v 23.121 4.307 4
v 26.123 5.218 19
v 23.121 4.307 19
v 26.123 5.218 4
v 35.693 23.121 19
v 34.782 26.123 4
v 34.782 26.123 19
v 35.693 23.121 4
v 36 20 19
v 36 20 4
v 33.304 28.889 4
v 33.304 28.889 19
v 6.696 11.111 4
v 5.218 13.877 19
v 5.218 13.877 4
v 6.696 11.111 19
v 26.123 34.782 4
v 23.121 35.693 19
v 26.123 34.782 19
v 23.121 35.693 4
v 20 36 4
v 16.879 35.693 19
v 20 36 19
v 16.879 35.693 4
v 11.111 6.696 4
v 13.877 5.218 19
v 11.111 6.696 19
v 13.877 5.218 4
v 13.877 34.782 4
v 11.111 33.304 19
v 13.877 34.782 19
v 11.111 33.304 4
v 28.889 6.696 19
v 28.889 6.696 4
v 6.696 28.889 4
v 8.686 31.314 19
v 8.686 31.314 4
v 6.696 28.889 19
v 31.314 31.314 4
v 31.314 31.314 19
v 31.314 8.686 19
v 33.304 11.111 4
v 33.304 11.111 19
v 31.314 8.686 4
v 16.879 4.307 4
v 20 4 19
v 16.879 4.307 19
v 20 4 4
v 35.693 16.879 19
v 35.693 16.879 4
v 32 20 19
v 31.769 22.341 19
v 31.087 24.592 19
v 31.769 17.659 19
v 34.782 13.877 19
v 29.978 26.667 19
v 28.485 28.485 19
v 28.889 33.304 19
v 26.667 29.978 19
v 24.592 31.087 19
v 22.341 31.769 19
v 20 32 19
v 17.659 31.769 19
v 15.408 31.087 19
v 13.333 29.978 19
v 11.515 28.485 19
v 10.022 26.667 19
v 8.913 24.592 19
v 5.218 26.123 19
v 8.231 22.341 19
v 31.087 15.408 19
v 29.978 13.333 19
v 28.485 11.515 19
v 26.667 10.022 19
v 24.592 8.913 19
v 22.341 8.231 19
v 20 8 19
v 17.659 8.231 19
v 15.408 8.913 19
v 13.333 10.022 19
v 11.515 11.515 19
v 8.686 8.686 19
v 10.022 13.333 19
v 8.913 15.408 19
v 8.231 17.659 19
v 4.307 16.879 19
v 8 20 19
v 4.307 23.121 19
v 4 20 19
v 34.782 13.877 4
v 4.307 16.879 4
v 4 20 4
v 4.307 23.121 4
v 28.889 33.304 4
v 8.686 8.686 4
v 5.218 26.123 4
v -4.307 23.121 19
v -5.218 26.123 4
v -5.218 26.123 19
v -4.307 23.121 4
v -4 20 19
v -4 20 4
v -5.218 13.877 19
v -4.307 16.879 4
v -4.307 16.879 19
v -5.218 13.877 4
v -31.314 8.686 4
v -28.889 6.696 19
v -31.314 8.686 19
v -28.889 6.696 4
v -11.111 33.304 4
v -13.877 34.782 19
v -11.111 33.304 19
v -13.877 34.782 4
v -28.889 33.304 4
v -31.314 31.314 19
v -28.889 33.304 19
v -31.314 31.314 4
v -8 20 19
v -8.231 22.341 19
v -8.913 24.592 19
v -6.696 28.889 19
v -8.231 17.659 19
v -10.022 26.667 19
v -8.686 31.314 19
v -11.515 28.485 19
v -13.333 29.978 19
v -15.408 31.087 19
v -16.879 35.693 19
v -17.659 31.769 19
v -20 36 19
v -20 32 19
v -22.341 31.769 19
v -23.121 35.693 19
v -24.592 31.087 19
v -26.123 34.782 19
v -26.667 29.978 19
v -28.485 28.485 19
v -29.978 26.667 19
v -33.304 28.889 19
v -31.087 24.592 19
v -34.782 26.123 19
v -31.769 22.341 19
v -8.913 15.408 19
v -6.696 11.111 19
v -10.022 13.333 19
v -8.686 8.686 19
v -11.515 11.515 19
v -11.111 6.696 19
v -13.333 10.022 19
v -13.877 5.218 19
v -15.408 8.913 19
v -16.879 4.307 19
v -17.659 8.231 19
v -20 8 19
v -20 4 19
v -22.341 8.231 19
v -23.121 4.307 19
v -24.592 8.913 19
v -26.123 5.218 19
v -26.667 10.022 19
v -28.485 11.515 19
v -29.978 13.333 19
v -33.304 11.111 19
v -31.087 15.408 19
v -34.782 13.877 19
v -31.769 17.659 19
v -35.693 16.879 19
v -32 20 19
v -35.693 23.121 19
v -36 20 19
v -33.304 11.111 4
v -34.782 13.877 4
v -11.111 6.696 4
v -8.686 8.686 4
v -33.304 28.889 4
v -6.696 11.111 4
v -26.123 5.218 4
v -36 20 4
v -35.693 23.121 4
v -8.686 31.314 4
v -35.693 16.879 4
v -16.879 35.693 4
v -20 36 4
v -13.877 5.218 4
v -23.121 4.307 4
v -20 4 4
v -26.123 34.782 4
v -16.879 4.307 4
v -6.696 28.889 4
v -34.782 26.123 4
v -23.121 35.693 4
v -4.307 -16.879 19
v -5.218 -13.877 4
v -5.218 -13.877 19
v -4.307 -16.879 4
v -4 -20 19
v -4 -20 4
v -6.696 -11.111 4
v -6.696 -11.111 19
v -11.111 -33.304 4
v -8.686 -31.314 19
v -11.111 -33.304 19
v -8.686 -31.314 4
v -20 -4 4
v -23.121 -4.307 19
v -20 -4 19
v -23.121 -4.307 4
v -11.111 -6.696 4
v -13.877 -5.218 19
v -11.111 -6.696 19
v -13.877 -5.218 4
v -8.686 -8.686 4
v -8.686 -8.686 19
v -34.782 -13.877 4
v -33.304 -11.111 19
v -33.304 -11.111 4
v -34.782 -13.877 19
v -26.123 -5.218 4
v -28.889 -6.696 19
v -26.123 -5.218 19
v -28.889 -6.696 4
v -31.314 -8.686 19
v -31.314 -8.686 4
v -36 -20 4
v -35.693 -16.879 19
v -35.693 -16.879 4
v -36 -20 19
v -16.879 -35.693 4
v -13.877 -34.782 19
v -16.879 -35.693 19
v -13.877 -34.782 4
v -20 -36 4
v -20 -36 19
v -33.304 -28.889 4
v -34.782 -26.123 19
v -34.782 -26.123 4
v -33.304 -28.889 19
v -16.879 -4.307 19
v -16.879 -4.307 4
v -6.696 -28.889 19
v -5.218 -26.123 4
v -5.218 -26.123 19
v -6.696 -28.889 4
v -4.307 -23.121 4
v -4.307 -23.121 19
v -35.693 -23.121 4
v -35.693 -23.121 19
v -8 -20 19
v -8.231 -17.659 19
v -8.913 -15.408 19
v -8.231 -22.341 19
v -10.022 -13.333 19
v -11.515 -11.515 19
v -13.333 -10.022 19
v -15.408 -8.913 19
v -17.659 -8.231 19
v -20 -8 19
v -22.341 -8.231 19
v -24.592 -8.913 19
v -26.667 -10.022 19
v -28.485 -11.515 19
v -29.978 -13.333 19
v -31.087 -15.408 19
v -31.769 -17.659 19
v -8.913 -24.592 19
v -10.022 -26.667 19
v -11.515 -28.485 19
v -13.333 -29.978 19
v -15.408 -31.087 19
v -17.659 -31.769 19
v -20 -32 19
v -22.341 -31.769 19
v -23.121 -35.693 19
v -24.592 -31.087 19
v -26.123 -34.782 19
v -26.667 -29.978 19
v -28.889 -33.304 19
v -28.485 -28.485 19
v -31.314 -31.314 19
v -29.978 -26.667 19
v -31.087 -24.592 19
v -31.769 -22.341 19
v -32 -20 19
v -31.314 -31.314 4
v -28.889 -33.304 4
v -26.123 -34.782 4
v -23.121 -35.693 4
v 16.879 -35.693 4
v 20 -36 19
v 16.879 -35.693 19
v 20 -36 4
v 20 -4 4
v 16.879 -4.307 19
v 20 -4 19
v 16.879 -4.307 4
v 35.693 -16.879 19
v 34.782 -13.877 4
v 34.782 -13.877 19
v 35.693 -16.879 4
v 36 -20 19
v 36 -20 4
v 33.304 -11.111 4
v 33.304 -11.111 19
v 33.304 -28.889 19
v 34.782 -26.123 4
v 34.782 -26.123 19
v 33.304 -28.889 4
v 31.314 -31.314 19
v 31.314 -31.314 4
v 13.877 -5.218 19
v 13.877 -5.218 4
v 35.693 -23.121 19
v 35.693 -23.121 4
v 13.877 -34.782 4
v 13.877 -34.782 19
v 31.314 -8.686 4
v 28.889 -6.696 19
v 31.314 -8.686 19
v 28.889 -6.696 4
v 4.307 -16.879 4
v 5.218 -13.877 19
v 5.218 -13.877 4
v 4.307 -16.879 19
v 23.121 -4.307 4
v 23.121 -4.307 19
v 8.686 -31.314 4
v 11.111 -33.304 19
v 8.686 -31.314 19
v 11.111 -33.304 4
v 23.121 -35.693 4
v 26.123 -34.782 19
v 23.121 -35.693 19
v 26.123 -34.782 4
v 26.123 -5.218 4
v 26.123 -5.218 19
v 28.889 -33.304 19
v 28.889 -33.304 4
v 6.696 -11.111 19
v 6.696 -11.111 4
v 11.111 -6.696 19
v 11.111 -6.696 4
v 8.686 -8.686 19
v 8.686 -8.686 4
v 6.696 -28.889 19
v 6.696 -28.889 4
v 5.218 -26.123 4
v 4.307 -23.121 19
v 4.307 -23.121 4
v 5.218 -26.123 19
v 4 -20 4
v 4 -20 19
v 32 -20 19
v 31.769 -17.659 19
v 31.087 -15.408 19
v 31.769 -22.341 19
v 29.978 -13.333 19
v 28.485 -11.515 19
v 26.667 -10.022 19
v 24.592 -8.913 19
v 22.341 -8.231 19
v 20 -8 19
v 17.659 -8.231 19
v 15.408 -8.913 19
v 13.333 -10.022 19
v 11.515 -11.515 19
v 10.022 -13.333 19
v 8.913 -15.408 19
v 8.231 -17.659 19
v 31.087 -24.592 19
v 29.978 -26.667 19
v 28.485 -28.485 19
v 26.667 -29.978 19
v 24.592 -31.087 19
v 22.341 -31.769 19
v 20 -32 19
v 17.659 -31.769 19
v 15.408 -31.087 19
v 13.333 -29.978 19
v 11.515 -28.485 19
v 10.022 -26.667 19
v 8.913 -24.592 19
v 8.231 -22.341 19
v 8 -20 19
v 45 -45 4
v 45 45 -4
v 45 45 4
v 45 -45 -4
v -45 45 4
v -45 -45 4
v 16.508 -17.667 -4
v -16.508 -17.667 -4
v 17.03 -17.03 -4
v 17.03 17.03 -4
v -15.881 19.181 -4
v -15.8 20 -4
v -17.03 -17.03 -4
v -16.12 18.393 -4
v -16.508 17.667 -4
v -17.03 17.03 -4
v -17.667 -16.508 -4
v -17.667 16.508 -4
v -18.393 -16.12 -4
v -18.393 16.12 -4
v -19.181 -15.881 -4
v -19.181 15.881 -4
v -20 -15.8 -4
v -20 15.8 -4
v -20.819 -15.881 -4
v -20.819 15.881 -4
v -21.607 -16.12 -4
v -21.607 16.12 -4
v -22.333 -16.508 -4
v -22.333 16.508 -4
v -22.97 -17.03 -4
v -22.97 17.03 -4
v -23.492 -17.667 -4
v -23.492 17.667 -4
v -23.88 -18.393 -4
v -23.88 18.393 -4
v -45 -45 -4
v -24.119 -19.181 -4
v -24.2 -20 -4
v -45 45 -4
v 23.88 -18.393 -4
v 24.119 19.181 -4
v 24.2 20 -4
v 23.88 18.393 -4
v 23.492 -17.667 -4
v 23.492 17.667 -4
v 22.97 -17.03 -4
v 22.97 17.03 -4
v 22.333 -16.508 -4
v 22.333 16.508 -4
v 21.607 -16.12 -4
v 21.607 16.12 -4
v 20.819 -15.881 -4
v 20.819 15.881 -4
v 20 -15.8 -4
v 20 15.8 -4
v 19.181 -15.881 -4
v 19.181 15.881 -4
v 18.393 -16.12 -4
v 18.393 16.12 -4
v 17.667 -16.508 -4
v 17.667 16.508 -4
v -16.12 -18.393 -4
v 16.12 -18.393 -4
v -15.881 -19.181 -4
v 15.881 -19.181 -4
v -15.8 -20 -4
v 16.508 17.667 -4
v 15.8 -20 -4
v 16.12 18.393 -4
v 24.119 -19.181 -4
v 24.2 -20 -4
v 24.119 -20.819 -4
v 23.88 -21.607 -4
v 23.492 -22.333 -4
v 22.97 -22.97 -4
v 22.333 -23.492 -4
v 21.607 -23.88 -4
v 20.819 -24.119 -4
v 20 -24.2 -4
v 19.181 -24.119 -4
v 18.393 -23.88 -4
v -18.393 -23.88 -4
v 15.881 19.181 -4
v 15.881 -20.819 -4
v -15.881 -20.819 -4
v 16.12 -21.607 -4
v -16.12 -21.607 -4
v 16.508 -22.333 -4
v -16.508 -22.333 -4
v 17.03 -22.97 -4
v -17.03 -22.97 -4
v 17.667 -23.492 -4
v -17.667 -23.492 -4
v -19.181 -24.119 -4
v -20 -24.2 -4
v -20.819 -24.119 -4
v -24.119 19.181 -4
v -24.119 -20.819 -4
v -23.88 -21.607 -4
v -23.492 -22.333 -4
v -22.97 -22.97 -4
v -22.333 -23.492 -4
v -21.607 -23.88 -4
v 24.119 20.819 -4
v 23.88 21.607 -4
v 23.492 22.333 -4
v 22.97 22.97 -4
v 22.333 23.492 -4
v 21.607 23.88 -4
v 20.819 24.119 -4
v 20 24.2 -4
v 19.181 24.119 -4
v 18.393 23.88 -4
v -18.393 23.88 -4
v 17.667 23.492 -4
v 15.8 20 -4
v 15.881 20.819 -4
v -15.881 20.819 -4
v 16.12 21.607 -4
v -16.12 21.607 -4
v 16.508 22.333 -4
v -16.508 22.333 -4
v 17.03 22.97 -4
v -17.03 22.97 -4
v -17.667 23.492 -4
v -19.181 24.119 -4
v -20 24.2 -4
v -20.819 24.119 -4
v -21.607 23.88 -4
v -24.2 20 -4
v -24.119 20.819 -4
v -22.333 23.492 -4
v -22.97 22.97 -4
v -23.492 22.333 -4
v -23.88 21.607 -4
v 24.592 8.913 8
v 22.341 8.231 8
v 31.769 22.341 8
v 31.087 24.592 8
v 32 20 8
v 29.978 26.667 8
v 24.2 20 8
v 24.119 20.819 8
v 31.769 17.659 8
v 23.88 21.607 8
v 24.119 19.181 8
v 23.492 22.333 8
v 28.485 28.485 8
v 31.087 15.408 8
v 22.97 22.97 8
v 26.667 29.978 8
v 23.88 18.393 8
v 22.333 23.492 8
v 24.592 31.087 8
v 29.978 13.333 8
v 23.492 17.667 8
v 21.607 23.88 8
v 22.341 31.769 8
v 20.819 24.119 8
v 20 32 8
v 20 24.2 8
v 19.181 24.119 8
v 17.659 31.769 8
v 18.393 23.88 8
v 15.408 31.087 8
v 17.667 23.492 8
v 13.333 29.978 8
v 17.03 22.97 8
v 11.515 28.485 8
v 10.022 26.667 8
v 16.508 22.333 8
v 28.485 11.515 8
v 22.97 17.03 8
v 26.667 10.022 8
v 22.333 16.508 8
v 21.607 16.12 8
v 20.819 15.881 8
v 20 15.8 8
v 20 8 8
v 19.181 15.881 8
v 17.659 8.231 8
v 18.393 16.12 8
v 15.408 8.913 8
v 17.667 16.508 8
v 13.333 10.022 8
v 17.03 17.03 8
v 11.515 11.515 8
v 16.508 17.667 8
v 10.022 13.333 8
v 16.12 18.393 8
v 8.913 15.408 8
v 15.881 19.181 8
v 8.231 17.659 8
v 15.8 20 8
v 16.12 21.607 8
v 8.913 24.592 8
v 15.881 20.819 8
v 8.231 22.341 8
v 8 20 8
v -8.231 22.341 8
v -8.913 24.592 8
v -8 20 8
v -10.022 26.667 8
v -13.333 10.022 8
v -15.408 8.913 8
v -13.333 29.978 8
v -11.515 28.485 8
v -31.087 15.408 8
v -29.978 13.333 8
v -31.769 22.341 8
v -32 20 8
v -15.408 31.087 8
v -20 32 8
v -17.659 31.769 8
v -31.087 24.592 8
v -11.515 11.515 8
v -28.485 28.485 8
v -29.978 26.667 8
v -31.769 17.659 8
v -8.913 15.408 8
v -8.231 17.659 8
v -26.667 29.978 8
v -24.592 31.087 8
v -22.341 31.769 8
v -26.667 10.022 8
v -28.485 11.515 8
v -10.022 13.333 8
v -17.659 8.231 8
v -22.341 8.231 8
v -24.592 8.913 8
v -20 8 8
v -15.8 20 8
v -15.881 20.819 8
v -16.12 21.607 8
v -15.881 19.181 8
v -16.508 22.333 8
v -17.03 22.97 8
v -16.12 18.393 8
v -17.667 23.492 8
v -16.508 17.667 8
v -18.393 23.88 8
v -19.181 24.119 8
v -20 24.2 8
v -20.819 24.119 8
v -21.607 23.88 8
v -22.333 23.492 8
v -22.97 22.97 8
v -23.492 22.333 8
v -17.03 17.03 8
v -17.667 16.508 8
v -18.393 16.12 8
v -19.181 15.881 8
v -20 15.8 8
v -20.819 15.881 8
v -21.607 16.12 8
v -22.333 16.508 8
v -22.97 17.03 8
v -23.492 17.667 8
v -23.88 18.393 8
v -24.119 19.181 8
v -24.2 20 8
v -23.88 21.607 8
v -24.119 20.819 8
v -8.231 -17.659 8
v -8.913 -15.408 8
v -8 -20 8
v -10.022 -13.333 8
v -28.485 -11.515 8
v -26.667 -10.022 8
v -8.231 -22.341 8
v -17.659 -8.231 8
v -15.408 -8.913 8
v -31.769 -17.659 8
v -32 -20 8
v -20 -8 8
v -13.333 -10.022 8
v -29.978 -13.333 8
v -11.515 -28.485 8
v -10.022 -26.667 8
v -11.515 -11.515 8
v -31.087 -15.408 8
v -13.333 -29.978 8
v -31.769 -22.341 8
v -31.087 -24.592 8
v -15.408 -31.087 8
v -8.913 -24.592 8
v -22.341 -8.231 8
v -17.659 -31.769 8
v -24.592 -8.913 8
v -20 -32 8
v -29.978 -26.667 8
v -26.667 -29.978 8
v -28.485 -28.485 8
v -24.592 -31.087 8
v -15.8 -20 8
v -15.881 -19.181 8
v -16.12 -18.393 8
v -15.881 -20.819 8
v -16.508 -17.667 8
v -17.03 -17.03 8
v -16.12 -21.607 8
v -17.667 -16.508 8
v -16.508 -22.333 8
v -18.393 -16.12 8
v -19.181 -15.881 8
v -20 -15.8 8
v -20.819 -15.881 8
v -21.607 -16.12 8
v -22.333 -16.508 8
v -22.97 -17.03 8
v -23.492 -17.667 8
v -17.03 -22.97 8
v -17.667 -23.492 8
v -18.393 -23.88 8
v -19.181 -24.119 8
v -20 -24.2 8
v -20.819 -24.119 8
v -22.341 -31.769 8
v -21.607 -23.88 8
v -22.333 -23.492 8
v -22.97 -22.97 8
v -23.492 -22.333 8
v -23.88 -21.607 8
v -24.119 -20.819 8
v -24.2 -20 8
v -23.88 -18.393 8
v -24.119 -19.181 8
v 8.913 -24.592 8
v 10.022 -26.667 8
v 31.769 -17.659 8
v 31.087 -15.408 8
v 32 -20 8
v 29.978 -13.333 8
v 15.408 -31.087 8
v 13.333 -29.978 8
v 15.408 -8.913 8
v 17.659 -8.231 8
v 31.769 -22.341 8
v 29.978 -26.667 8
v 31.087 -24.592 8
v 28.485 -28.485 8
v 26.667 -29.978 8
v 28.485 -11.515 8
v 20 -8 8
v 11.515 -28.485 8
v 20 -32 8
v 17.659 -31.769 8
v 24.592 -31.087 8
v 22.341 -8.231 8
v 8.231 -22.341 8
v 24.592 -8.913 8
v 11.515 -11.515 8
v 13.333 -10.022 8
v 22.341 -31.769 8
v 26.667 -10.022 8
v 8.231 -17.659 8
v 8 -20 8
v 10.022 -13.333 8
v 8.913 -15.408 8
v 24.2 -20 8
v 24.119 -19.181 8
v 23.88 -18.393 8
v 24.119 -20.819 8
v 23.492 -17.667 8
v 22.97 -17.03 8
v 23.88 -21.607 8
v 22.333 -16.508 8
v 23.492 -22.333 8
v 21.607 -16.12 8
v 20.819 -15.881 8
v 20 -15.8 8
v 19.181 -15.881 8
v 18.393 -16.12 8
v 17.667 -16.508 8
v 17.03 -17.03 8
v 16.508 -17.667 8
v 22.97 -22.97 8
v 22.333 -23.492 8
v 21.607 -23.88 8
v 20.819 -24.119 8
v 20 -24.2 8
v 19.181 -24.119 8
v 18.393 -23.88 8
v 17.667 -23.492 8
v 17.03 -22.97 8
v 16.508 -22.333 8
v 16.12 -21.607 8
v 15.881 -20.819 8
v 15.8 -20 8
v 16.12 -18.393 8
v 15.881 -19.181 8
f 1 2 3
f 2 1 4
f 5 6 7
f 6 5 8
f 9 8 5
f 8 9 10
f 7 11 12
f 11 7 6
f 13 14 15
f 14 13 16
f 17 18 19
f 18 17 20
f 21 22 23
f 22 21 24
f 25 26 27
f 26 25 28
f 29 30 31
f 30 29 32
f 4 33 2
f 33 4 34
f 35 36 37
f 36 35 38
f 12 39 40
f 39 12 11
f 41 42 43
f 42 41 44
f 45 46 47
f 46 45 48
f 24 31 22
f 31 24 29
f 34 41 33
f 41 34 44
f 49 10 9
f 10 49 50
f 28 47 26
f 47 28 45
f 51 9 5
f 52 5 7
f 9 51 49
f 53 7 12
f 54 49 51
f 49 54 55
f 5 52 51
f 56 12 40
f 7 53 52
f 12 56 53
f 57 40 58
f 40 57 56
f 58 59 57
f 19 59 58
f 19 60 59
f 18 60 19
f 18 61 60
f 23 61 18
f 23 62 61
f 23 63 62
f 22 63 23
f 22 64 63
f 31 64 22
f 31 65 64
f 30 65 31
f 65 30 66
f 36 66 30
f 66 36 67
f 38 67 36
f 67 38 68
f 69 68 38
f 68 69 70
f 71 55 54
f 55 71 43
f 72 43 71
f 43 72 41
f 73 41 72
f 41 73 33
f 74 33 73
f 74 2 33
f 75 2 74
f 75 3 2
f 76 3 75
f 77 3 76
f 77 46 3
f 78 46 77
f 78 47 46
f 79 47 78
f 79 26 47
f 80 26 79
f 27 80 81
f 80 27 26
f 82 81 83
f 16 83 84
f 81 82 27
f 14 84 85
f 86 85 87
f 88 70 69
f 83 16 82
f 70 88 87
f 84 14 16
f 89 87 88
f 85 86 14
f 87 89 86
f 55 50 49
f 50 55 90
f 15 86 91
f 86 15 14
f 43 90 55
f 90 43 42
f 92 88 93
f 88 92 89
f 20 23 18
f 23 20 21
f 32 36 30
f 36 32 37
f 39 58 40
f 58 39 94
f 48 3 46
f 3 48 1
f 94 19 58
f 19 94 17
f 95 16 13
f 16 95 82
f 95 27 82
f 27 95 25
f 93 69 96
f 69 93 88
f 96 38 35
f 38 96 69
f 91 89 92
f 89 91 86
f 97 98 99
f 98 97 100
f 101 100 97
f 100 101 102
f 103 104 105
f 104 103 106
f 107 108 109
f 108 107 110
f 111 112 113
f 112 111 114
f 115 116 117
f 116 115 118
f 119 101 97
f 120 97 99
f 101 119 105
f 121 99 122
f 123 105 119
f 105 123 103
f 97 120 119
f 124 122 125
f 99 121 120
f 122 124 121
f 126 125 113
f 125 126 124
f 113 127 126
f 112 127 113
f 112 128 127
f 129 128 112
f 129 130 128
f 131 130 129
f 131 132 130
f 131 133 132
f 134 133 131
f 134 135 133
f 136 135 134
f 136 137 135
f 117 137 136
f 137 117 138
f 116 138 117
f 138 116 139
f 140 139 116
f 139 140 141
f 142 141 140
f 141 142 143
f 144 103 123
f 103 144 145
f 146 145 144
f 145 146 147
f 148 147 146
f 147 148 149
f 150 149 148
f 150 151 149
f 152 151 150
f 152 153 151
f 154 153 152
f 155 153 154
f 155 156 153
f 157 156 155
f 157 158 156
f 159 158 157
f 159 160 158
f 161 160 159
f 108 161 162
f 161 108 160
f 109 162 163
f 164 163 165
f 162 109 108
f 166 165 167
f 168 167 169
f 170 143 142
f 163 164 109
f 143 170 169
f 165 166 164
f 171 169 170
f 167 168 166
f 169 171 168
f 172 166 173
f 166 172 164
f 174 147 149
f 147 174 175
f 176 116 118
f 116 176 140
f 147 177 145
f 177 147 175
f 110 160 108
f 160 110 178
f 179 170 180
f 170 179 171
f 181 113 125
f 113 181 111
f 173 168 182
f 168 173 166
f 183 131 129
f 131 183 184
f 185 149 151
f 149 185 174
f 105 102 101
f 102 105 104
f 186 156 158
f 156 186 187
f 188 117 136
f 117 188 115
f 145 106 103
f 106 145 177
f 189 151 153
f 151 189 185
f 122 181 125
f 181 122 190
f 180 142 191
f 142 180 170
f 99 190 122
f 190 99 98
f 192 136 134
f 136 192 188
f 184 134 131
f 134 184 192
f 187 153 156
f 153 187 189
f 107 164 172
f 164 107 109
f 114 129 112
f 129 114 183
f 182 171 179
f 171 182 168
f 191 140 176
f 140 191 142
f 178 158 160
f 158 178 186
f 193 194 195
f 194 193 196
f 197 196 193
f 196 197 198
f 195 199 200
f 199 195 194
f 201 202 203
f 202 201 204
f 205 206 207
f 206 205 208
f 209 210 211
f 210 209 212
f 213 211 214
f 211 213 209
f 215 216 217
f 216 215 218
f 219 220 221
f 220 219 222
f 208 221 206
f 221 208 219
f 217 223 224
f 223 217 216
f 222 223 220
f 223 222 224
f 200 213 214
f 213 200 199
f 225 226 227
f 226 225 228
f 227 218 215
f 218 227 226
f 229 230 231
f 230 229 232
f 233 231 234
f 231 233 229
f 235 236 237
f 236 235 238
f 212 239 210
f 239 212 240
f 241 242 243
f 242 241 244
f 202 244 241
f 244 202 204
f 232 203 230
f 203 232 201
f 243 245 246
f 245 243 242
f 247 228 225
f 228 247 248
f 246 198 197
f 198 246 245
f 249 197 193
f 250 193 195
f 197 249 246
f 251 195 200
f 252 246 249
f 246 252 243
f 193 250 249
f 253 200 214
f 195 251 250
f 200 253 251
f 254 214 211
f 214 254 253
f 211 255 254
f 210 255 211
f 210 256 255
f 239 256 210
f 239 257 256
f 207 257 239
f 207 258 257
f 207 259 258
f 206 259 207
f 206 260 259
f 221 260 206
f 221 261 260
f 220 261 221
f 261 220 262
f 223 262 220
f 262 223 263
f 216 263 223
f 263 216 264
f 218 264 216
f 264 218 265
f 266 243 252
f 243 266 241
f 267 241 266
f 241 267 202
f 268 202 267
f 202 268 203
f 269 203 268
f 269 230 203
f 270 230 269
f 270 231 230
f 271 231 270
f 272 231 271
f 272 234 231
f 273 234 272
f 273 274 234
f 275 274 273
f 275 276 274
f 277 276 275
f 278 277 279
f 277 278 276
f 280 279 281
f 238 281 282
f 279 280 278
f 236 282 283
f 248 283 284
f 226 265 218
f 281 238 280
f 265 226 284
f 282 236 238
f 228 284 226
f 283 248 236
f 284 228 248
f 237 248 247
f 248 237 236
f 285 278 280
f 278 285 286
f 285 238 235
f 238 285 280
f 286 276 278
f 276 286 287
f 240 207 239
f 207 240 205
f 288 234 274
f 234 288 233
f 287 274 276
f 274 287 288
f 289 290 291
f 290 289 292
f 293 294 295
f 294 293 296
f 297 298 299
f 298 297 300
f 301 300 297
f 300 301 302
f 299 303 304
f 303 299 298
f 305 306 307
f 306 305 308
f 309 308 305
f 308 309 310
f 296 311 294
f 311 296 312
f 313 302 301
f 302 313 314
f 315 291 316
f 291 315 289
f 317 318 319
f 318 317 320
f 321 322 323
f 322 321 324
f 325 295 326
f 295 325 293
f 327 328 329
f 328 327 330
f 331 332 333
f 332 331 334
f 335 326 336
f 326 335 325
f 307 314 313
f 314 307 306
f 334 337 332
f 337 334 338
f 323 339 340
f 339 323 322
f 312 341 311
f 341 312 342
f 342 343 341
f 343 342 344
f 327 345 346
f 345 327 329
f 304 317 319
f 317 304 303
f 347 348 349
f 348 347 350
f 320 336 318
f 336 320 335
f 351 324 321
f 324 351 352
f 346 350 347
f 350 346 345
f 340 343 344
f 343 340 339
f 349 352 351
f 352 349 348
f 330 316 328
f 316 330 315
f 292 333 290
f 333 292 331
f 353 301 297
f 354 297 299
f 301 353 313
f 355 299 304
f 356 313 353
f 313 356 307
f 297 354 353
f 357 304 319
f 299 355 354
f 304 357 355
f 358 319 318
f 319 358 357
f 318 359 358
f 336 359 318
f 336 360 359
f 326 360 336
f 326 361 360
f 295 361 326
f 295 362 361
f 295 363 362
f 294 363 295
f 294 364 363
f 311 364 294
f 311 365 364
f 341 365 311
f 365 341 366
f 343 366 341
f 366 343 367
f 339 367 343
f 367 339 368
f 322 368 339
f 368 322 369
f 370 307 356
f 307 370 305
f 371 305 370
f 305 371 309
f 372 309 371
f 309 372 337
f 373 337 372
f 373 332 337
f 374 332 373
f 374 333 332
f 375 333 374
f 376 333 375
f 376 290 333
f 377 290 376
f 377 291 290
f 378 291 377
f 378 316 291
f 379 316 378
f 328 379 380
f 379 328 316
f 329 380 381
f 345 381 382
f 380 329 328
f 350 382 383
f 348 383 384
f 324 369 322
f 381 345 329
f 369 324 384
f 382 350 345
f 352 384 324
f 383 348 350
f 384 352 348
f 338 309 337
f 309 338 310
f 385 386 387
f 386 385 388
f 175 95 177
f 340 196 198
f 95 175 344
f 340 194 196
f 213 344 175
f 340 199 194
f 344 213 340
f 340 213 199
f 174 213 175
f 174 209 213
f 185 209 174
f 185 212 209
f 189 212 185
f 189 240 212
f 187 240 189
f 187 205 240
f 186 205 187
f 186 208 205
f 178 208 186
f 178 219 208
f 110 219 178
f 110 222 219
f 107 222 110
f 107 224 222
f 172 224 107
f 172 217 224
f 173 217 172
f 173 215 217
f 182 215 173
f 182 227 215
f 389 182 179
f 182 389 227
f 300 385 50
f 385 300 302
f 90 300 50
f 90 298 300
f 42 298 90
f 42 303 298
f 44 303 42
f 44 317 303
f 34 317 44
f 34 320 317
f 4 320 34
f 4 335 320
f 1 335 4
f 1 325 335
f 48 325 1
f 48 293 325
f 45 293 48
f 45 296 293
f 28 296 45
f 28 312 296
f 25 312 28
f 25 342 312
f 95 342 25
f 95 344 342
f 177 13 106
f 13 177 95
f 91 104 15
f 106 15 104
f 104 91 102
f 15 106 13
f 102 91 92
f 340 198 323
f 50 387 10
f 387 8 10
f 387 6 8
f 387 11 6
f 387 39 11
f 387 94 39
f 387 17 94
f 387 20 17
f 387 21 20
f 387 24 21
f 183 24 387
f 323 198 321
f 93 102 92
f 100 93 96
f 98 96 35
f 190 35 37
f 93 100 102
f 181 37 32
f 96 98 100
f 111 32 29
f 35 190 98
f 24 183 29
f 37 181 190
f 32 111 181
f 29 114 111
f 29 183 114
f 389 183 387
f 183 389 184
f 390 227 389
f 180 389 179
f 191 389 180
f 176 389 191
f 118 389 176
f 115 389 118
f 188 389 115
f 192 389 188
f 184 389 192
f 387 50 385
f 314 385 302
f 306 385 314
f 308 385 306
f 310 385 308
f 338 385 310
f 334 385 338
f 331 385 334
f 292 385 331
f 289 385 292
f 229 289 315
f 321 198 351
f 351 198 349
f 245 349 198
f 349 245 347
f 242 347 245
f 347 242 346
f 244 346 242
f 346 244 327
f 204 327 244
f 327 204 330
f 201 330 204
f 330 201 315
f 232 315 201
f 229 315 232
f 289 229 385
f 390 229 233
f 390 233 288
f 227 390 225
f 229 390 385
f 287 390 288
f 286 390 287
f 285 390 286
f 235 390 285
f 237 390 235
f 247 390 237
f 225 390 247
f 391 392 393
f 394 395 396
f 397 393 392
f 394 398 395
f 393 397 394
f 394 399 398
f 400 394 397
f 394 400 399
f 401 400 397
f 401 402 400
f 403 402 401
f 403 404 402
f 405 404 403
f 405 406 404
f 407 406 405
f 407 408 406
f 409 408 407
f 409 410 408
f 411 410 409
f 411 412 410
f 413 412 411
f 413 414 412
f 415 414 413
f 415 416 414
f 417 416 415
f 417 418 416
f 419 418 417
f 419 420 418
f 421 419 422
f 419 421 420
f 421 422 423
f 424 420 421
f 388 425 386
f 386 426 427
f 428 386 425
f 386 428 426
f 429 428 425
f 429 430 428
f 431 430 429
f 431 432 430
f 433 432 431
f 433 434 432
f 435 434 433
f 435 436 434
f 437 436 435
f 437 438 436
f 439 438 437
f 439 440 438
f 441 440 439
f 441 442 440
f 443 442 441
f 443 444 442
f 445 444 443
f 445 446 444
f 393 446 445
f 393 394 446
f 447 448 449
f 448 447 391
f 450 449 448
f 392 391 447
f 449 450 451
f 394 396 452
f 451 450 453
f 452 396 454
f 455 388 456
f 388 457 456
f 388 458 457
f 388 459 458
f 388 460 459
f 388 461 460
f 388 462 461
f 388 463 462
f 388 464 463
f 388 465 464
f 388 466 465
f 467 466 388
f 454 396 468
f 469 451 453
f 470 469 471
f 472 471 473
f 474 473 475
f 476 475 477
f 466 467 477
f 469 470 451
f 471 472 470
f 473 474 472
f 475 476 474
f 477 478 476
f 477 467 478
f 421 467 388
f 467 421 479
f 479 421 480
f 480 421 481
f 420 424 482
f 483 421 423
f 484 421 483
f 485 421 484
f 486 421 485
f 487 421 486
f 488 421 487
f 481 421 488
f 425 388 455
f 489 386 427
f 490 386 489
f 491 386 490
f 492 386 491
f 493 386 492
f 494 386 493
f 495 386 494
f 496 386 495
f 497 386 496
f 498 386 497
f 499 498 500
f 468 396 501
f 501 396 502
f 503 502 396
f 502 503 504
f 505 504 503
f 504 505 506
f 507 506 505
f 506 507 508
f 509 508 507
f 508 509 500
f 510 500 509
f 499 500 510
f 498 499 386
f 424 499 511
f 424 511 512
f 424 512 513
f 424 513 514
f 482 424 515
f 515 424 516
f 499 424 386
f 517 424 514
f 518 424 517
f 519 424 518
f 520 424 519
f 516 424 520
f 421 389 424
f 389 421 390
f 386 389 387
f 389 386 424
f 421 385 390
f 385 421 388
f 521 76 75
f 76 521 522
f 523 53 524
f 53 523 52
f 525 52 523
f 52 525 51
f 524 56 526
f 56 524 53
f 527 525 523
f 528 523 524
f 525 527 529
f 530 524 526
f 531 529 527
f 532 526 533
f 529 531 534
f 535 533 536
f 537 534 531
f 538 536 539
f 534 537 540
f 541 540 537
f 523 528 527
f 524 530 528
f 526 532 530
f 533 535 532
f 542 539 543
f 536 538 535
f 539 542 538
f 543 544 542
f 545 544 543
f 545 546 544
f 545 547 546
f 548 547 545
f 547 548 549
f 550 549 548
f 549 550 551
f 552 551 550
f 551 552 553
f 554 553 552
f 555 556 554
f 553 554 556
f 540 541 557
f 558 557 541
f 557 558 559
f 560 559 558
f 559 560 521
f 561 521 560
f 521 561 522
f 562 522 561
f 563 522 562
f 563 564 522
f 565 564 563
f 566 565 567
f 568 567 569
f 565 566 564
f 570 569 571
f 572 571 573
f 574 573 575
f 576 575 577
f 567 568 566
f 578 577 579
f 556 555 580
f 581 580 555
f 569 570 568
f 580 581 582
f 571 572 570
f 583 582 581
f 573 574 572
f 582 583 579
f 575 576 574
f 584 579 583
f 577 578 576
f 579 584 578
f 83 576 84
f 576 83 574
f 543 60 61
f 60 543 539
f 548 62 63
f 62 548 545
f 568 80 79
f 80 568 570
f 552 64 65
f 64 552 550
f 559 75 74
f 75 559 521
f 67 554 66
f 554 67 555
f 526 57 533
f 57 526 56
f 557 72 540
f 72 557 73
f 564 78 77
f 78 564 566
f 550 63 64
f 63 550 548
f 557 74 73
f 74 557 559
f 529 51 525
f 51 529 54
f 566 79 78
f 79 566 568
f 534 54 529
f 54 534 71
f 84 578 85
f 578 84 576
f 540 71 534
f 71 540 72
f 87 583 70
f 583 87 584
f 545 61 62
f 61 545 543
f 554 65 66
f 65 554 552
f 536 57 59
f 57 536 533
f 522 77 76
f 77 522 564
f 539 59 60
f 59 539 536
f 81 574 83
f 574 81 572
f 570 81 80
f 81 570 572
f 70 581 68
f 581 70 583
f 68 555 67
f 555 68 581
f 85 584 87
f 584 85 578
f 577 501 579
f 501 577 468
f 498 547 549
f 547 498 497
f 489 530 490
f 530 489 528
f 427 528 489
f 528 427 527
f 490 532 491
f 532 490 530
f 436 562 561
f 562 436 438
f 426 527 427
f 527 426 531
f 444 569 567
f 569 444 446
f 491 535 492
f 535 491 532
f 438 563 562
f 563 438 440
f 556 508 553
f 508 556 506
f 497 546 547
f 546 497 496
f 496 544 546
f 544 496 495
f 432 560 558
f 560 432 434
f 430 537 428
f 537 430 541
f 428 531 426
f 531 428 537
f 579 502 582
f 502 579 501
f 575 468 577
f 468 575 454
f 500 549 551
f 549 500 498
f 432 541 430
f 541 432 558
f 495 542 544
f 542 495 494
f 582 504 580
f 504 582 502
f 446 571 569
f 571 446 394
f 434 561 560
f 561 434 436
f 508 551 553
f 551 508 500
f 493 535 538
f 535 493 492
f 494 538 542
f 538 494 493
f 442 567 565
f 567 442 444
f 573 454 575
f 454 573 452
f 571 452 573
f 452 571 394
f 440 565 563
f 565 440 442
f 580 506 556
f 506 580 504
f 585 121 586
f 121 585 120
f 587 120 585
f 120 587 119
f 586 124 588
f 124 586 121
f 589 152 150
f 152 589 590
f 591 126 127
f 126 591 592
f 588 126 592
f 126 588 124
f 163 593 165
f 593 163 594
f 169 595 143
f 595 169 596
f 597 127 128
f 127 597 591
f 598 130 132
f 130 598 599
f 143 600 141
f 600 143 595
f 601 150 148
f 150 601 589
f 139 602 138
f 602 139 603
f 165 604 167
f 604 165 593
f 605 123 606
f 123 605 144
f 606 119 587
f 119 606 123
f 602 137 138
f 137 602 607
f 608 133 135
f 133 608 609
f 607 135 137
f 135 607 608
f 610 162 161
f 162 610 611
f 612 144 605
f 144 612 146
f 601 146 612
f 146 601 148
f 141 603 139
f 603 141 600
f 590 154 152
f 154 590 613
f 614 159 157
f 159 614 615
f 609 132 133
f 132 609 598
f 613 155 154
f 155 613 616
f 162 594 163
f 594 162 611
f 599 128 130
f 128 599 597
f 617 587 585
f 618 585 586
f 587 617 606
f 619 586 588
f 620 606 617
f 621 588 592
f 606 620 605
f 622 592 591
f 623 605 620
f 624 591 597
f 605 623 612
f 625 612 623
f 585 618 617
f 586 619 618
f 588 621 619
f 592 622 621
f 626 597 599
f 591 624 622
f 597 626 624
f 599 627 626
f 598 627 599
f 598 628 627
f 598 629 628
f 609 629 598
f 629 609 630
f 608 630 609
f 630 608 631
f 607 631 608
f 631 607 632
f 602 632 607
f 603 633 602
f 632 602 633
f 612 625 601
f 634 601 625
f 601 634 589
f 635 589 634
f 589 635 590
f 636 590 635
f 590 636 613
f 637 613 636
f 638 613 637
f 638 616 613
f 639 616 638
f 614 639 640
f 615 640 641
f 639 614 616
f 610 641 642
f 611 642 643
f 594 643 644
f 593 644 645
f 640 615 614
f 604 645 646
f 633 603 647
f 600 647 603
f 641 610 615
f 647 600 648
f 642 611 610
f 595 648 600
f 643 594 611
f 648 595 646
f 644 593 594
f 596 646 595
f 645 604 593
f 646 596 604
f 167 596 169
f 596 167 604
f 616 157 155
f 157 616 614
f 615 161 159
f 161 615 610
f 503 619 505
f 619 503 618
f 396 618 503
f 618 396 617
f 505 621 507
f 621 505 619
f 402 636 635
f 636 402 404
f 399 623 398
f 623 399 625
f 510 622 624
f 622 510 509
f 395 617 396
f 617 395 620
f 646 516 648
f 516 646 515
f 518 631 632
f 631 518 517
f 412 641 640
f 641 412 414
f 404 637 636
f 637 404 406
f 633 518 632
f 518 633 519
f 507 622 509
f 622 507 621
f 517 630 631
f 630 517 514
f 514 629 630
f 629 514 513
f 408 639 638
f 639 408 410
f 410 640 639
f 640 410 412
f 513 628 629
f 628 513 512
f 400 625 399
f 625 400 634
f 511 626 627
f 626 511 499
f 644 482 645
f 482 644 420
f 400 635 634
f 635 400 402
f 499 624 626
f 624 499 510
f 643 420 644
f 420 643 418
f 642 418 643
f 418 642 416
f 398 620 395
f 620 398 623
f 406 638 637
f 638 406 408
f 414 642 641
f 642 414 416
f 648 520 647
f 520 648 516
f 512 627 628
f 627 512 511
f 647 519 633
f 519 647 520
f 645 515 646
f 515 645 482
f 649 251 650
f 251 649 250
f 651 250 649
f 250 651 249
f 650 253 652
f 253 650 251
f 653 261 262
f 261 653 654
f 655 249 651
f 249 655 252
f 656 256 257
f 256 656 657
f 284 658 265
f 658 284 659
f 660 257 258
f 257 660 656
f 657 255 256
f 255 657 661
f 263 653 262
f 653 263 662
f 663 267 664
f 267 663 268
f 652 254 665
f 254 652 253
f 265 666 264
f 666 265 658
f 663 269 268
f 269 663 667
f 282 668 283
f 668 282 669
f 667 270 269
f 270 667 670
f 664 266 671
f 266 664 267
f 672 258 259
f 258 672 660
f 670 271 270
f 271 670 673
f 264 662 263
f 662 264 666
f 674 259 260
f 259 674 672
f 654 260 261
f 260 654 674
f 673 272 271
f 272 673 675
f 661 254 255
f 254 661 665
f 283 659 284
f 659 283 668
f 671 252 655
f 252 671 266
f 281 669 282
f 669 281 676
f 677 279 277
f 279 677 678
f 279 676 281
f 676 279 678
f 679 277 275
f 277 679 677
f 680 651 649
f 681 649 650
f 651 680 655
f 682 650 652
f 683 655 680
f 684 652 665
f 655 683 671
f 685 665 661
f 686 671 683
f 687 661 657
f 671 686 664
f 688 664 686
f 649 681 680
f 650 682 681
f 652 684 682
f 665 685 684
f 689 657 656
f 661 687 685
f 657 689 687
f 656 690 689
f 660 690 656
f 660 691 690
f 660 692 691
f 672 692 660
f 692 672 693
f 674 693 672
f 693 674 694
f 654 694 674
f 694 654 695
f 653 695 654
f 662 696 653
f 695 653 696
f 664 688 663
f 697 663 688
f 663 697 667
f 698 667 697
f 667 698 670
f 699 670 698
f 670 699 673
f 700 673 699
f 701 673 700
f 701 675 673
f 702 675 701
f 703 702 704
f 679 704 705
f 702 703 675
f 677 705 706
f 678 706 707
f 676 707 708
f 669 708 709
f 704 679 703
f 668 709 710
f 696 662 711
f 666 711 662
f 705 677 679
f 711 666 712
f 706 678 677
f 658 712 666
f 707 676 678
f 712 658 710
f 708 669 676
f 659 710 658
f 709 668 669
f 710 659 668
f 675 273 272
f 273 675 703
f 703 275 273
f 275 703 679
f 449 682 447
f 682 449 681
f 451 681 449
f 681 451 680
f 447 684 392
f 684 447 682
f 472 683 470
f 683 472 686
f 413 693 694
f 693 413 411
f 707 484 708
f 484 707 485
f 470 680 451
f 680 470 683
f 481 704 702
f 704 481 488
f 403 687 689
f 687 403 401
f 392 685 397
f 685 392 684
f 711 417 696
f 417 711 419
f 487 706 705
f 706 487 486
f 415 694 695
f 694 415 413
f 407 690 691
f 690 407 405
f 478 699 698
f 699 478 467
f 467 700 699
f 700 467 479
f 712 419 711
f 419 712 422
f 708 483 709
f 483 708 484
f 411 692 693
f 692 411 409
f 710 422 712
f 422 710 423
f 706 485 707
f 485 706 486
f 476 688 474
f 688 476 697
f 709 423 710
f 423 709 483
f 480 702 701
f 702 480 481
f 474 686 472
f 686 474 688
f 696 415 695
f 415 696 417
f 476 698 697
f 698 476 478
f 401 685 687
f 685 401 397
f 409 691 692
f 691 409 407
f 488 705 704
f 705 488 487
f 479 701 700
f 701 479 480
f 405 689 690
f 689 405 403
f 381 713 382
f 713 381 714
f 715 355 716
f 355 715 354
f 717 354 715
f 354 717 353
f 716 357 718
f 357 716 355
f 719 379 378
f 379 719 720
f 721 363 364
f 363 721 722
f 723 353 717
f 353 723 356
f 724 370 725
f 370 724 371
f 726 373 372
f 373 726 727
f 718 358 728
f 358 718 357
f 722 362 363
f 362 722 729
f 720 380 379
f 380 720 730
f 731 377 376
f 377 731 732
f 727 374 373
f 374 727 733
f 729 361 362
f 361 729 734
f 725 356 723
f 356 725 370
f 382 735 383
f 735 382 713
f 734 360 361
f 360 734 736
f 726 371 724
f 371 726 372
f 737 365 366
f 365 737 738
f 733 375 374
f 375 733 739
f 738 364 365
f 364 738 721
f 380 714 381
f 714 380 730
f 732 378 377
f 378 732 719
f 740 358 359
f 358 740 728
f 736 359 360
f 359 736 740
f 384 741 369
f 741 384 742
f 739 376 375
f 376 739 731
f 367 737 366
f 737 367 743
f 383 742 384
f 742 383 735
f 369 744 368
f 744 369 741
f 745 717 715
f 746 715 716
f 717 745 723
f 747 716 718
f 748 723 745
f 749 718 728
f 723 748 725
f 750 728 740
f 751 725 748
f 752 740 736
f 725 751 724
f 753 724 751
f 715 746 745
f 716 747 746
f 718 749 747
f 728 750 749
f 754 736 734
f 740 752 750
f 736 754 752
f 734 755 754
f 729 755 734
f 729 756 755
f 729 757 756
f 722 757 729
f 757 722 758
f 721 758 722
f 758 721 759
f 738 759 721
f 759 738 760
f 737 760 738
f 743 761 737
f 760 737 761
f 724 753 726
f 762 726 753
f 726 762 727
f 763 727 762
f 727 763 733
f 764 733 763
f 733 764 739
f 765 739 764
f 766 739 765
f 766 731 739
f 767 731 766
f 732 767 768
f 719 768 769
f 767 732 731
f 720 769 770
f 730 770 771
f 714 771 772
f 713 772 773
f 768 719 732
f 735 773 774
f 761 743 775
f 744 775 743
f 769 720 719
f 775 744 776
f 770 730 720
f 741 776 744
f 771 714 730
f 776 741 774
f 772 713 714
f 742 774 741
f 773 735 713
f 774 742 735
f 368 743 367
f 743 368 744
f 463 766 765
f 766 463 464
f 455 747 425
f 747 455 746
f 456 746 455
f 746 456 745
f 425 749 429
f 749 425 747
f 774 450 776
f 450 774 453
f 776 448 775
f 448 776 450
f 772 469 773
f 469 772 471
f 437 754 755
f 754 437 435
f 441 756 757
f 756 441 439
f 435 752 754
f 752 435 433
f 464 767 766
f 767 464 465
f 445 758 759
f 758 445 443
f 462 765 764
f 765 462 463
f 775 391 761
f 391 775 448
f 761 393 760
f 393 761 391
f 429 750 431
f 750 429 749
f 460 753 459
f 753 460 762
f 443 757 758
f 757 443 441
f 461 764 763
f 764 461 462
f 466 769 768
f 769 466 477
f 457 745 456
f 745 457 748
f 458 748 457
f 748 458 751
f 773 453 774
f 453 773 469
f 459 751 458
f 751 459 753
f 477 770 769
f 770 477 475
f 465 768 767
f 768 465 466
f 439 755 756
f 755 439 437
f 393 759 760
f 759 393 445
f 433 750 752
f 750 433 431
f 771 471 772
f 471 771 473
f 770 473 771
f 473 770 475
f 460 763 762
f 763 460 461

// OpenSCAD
$fn = 32;

// ----------------------------------------------------------------------
// Socket pad plate
// bosses with counterbored sockets for the screws
// ----------------------------------------------------------------------

// --- parameters (mm) ---
base_t = 8;           // base plate thickness
boss_h = 15;          // boss height above the base plate
boss_d = 32;          // boss diameter
socket_d = 24;        // socket diameter
socket_depth = 11;    // socket depth from the boss face
bolt_d = 8.4;         // screw clearance hole through the socket floor
plate = [90, 90, 8];  // overall size (x, y, z)
edge = 25;            // boss centre offset from the plate edge
pads = 4;             // boss count, one per corner

// --- derived feature positions (mm) ---
height = base_t + boss_h;        // = 23   overall height of the part
corner_x = plate[0] / 2 - edge;  // = 20   boss centre X
corner_y = plate[1] / 2 - edge;  // = 20   boss centre Y
feature_centers = [
  [corner_x, corner_y],
  [-corner_x, corner_y],
  [-corner_x, -corner_y],
  [corner_x, -corner_y]
];   // boss centres: sockets, holes and the pads themselves are placed from here

// base plate, bosses on feature_centers, socket + through hole in each
difference() {
  union() {
    cube(plate, center = true);
    for (centre = feature_centers)
      translate([centre[0], centre[1], plate[2] / 2 - 1])
        cylinder(d = boss_d, h = boss_h + 1);
  }
  for (centre = feature_centers) {
    translate([centre[0], centre[1], plate[2] / 2 + boss_h - socket_depth])
      cylinder(d = socket_d, h = socket_depth + 1);
    translate([centre[0], centre[1], -height])
      cylinder(d = bolt_d, h = 2 * height + 2);  // through the socket floor
  }
}
